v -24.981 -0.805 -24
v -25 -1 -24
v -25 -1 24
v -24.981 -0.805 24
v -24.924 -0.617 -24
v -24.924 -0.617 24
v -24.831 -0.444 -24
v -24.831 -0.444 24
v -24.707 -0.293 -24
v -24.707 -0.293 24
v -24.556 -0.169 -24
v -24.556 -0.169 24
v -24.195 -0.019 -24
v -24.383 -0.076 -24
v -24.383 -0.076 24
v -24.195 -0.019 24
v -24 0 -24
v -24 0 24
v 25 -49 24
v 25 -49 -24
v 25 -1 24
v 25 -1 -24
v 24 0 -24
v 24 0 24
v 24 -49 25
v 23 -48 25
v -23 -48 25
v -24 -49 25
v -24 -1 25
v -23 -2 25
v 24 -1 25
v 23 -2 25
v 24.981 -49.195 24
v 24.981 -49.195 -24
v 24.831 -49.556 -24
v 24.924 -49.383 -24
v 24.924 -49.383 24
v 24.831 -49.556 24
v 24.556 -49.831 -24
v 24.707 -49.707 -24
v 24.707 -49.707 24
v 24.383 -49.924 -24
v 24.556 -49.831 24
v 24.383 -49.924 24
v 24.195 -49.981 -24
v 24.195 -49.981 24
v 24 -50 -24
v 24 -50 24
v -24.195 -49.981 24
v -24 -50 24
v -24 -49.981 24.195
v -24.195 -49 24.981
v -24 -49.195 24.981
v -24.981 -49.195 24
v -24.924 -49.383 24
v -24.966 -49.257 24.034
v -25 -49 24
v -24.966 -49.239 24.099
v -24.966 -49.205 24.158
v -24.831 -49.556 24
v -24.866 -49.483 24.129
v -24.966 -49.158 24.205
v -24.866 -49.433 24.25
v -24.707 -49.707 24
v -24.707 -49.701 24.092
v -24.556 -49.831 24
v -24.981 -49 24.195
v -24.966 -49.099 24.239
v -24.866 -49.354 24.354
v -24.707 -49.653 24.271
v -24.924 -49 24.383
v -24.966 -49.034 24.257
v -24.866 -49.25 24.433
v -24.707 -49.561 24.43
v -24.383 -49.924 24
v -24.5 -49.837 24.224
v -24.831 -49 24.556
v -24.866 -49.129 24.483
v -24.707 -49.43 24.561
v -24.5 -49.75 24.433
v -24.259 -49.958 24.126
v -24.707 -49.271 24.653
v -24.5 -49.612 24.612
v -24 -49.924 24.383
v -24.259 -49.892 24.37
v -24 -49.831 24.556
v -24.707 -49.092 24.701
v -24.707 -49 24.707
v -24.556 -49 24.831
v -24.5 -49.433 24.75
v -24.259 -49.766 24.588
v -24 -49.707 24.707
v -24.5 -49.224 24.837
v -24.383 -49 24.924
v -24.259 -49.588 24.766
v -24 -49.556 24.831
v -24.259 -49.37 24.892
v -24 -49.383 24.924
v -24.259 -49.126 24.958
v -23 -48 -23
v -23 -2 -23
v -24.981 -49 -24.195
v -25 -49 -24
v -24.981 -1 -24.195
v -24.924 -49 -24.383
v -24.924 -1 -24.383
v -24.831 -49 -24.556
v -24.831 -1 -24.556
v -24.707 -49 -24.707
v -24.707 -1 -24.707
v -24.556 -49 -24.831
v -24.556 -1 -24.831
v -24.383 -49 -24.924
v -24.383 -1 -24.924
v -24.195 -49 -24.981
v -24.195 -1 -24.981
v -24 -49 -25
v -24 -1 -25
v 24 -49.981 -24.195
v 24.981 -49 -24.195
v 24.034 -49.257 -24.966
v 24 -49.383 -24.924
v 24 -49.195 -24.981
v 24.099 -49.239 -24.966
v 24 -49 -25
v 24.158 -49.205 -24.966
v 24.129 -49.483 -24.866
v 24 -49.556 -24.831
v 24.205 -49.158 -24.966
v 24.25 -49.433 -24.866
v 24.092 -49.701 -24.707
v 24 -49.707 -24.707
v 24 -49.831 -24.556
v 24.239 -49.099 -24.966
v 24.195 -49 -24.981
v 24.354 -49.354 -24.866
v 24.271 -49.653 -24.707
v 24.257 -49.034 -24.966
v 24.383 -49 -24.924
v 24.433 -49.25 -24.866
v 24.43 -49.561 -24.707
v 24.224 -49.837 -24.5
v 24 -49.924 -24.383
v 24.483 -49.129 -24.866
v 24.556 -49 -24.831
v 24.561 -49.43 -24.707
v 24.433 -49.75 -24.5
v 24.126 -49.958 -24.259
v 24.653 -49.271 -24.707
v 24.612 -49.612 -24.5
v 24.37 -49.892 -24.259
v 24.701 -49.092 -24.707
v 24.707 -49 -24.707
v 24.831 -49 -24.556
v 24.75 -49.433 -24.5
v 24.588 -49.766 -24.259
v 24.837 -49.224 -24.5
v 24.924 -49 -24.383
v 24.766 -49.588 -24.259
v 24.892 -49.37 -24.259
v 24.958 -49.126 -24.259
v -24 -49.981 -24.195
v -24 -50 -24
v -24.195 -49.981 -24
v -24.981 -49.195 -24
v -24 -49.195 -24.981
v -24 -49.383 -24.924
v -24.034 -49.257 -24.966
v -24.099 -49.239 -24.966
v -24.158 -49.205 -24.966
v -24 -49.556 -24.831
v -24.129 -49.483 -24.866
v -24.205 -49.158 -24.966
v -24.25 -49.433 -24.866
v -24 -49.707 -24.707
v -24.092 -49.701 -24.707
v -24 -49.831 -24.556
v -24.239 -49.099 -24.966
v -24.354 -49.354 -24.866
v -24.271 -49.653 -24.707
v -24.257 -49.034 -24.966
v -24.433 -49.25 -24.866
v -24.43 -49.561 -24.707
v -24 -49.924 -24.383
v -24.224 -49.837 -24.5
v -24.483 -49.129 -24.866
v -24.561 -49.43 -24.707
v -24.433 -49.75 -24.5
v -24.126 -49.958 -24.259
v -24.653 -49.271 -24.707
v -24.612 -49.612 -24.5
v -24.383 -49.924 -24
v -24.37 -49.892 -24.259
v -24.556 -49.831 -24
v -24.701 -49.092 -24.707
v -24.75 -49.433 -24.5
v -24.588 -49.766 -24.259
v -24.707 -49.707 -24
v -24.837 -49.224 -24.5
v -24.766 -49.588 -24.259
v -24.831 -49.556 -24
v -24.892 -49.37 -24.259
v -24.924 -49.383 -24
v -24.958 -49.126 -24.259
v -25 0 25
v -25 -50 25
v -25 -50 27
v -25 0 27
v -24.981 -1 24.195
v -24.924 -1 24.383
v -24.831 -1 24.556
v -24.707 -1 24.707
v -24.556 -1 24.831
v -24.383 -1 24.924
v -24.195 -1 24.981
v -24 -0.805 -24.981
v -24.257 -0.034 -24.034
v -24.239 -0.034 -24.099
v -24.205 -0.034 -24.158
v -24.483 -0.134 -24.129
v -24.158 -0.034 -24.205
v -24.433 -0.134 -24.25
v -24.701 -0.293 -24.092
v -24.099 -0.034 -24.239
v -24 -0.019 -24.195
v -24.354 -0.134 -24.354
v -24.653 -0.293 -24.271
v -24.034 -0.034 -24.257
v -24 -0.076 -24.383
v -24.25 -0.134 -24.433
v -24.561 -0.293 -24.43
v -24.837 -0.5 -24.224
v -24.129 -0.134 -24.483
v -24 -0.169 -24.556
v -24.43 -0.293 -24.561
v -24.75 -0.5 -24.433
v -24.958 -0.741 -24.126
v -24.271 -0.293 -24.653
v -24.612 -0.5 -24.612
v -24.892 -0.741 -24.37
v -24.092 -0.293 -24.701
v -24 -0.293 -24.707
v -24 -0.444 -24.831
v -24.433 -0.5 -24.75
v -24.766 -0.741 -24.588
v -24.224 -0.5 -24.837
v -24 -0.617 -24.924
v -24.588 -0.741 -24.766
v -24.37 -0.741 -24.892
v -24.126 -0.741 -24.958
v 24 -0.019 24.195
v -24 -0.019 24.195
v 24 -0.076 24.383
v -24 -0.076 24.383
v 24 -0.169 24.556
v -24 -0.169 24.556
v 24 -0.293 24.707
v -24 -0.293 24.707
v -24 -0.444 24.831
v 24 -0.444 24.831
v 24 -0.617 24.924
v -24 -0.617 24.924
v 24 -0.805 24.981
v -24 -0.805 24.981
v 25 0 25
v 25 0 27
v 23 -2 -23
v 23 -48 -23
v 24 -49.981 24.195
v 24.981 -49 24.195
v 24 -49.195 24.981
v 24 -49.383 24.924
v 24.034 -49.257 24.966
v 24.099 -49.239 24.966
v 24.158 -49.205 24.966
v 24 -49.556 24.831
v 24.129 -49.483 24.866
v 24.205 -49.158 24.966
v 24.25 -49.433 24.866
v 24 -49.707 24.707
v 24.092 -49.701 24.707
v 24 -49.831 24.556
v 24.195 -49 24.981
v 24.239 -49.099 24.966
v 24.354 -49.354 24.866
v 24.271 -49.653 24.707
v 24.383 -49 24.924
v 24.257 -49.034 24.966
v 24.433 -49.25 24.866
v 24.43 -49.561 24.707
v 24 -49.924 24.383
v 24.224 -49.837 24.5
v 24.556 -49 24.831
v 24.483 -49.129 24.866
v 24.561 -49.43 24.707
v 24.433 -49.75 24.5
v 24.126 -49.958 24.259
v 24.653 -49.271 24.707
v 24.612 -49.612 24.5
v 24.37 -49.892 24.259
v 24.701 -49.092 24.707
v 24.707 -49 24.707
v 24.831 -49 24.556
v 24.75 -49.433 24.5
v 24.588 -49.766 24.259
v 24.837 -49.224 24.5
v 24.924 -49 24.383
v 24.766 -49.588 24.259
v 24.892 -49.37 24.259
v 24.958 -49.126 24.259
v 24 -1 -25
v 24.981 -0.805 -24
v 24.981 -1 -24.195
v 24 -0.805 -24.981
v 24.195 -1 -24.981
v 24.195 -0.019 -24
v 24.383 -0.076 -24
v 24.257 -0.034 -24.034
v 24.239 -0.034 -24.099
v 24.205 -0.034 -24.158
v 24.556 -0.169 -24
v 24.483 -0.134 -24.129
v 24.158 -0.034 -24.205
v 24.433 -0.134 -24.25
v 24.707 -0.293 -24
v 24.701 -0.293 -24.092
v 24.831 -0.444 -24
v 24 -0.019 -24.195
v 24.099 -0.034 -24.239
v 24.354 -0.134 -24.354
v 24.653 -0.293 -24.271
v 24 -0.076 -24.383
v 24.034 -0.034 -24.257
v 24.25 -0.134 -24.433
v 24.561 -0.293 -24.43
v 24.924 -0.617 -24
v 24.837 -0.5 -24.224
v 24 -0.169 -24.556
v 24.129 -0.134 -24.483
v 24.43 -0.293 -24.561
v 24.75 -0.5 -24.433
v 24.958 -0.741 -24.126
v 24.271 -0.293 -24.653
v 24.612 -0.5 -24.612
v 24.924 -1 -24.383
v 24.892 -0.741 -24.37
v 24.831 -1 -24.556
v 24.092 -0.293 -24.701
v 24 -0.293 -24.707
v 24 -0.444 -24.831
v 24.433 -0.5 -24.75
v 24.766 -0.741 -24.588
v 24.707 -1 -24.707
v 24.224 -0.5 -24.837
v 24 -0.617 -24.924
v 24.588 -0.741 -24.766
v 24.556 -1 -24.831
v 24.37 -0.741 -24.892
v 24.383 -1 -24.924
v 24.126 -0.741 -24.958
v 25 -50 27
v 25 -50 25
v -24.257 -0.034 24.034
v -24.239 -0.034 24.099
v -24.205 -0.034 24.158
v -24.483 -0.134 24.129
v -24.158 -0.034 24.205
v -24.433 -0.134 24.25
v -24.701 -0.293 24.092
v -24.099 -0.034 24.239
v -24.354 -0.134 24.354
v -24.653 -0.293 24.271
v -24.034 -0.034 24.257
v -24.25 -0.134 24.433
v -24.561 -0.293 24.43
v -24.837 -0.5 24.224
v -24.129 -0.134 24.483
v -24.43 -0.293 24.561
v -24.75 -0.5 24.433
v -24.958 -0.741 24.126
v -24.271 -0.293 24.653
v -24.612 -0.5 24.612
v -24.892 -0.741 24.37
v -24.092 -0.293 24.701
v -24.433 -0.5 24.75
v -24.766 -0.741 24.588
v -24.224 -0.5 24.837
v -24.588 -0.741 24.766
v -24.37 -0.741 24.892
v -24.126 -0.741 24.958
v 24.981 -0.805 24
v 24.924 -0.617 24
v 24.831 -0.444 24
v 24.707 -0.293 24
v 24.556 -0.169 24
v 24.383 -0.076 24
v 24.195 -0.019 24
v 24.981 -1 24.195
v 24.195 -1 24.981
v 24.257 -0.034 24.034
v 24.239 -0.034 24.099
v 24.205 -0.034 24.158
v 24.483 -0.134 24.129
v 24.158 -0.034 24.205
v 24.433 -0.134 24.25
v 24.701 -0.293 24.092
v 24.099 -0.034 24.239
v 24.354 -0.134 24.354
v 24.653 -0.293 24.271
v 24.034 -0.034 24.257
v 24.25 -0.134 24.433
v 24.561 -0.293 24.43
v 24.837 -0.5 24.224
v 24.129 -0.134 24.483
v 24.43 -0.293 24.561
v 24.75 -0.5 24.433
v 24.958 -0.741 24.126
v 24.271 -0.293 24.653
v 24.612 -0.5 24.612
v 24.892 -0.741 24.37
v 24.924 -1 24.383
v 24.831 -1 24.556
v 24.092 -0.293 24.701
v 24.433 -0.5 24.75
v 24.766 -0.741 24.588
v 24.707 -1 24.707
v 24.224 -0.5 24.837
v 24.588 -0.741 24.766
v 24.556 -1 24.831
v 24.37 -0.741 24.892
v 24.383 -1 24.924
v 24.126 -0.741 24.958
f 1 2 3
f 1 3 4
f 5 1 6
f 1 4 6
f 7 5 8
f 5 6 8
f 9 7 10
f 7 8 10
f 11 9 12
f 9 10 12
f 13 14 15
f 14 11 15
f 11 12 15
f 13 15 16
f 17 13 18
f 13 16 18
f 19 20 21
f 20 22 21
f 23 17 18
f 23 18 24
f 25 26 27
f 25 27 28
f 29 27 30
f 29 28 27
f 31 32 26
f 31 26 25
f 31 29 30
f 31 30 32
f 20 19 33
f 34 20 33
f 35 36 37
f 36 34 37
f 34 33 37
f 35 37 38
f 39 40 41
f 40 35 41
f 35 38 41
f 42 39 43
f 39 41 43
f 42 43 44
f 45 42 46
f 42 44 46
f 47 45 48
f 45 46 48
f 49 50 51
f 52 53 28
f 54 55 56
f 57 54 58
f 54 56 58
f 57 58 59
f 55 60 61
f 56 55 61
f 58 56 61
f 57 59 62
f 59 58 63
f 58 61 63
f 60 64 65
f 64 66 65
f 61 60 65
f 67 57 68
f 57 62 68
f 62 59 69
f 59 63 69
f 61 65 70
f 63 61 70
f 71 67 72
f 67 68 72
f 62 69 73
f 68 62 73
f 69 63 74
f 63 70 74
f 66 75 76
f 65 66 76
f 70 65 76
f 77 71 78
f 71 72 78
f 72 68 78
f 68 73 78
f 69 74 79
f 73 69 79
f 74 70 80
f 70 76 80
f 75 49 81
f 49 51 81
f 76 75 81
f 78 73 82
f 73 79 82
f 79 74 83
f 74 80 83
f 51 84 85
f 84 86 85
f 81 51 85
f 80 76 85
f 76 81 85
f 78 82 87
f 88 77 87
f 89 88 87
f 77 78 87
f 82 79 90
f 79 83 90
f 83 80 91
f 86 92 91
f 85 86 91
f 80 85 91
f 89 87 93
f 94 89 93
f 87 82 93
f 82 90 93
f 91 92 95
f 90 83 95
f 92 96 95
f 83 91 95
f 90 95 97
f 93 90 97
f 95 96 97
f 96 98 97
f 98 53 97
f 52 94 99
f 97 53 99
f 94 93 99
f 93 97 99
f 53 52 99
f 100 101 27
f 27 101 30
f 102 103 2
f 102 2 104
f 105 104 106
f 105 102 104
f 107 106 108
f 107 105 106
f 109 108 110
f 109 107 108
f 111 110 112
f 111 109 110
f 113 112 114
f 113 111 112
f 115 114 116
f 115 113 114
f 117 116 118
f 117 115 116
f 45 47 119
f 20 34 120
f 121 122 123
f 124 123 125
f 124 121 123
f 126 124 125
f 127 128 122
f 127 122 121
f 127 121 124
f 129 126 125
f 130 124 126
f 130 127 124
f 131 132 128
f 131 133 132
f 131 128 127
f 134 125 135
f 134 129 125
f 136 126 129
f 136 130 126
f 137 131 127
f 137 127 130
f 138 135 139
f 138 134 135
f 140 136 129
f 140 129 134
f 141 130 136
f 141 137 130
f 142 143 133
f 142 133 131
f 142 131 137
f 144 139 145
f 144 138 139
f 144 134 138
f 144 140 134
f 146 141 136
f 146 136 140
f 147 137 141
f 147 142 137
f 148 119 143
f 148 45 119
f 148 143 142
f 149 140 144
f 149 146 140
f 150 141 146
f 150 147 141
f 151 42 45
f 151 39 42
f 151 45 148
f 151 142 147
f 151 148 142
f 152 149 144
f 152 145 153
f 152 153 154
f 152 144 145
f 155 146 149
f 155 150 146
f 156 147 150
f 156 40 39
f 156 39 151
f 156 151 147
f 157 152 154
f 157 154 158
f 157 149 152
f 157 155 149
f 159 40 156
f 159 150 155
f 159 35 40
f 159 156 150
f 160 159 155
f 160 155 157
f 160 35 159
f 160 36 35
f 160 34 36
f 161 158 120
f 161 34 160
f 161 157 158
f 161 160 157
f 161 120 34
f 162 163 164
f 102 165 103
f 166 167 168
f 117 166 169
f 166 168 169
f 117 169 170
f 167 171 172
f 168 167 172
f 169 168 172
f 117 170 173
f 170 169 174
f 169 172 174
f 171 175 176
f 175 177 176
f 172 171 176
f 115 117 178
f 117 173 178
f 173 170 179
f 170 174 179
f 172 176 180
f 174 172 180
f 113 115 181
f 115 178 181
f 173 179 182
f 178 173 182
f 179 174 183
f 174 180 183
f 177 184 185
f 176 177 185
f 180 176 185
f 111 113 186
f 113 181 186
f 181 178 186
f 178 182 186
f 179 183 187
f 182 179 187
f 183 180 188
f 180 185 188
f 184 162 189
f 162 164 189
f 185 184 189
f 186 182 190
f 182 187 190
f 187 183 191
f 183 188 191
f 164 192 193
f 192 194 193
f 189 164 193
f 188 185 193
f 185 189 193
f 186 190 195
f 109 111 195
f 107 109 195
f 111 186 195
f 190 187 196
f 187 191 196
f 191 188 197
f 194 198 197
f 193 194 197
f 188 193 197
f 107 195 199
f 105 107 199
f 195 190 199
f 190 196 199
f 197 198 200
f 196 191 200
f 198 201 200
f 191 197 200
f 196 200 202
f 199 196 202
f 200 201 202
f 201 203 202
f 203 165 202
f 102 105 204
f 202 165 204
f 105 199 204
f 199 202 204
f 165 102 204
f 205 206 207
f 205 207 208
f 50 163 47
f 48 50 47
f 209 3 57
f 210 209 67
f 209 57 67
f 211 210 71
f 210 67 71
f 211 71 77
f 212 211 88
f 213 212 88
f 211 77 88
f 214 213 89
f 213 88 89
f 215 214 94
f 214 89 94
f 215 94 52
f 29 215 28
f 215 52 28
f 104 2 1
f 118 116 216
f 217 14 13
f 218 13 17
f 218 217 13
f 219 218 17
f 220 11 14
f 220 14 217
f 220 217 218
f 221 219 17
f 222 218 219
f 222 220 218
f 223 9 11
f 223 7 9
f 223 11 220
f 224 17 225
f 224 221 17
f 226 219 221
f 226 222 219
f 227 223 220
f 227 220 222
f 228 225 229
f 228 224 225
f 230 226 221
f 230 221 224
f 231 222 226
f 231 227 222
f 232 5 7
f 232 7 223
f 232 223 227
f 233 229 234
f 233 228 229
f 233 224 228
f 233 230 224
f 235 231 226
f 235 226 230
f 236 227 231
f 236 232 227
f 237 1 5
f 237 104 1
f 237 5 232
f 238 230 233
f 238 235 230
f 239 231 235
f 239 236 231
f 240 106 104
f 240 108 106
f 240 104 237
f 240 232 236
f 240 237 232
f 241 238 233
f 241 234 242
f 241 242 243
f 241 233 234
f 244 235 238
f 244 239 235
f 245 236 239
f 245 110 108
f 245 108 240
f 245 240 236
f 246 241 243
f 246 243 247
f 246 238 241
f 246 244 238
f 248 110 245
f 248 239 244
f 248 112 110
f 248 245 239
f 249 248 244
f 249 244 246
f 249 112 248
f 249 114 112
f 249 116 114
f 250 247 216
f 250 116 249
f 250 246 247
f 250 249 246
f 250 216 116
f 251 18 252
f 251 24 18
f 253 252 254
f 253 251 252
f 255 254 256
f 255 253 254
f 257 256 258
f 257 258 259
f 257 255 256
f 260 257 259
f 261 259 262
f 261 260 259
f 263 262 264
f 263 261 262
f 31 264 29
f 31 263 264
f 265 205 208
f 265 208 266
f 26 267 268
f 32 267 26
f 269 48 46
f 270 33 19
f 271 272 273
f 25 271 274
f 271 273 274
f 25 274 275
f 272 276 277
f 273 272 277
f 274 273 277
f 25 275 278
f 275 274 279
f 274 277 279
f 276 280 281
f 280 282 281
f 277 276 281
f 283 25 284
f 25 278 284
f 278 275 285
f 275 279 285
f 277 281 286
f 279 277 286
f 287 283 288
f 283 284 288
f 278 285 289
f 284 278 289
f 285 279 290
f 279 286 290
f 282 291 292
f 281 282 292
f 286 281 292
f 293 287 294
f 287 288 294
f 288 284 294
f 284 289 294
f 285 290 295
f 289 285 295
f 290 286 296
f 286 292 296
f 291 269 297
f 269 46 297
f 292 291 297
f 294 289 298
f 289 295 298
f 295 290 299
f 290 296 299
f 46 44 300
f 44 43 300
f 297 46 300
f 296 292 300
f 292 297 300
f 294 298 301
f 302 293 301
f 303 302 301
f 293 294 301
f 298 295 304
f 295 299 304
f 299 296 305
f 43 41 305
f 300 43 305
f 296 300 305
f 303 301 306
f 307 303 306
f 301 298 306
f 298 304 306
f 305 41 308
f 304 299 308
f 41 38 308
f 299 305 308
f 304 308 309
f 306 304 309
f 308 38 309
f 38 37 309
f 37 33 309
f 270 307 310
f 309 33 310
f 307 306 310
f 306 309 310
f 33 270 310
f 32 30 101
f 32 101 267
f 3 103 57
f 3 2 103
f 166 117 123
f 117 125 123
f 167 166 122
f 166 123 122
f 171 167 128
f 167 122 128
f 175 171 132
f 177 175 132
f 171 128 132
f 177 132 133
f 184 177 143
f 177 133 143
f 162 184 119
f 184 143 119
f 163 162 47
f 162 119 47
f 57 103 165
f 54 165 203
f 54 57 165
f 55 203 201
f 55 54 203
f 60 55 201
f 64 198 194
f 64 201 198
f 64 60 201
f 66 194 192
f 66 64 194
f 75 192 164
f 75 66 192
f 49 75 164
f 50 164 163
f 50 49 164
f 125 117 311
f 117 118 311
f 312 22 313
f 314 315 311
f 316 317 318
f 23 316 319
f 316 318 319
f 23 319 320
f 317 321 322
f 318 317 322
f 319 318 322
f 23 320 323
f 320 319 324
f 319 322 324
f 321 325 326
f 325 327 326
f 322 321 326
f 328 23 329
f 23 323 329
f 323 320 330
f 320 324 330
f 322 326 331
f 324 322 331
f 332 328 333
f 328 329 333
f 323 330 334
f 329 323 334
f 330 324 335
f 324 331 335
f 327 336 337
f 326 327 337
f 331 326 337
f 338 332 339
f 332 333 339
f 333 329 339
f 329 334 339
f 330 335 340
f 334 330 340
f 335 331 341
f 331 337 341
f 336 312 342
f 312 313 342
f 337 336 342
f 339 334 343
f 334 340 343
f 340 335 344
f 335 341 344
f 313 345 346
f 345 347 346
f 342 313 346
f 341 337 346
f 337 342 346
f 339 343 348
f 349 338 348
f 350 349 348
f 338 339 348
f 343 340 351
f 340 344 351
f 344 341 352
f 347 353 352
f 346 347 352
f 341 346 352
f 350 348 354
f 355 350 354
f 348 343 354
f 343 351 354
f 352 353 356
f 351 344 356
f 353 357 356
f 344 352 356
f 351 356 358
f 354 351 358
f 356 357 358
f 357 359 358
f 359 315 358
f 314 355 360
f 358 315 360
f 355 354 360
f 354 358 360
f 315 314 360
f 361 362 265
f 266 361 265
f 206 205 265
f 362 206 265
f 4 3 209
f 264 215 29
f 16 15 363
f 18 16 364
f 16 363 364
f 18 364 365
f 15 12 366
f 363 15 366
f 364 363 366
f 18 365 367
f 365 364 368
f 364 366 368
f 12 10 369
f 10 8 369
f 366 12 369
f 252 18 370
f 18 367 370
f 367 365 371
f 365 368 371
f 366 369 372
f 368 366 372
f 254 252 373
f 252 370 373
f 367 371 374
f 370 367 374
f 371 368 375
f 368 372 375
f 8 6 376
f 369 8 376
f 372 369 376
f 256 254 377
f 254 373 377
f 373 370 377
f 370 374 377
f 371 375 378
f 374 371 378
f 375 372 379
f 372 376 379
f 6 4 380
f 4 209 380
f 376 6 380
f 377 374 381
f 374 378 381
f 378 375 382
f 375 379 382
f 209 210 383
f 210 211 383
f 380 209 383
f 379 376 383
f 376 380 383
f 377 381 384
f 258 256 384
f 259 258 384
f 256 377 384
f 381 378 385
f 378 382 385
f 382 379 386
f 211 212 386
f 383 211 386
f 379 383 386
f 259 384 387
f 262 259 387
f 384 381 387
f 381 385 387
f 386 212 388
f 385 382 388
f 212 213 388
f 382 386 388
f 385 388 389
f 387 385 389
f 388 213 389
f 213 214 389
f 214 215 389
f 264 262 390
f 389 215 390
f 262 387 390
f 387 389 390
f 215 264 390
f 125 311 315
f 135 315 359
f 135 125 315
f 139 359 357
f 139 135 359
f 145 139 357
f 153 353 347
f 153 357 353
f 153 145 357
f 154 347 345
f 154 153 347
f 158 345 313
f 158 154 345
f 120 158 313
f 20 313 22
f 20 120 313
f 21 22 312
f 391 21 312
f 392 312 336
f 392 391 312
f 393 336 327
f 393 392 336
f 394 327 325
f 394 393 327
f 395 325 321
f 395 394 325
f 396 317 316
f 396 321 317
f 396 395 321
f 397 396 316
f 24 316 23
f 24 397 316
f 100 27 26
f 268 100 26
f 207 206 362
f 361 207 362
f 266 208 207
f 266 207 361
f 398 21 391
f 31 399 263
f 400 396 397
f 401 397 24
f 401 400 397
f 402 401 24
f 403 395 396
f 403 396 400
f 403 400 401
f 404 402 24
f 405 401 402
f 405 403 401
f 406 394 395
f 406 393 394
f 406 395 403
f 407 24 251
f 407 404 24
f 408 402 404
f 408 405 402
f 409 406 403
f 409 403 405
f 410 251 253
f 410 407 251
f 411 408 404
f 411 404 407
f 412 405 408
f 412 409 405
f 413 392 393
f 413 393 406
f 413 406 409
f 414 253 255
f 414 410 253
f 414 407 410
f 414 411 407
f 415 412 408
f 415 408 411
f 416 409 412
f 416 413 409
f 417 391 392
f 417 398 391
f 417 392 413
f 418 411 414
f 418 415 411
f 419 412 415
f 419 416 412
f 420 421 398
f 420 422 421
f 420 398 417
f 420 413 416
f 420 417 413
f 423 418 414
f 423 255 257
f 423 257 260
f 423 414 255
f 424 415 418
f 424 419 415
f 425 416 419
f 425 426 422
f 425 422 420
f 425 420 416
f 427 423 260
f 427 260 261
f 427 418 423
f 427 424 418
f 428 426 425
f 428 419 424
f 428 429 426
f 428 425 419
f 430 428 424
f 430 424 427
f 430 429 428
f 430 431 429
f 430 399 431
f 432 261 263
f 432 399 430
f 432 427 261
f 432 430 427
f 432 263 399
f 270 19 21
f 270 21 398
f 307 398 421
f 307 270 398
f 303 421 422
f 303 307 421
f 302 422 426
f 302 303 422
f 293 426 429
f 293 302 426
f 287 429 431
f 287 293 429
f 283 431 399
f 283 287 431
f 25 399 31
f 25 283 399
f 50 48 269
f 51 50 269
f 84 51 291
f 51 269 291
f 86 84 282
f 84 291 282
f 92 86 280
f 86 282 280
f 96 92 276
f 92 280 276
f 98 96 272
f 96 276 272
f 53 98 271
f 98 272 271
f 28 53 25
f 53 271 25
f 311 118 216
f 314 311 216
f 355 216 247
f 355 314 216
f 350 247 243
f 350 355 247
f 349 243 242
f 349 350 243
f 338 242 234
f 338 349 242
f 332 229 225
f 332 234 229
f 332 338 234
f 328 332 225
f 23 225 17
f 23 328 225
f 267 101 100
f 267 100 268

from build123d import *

# Parameters (mm, degrees)
F0_W     = 50
F0_H     = 50
F1_DEPTH = 50
F2_T     = -2
F3_R     = 1
F5_W     = 50
F5_H     = 50
F6_DEPTH = 2


with BuildPart() as f1:
    # F0 (on Front) → F1 (new body)
    with BuildSketch(Plane.XZ):
        Rectangle(F0_W, F0_H)
    extrude(amount=F1_DEPTH)

    # F2
    f2_openings = [f1.faces().sort_by_distance(p)[0] for p in [
        (0, -25, 25),
    ]]
    offset(amount=F2_T, openings=f2_openings)

    # F3
    f3_edges = [f1.edges().sort_by_distance(p)[0] for p in [
        (25, -50, 0),
        (0, -50, 25),
        (-25, -50, 0),
        (0, -50, -25),
        (25, -25, -25),
        (25, -25, 25),
        (25, 0, 0),
        (-25, -25, 25),
        (-25, -25, -25),
        (-25, 0, 0),
        (0, 0, 25),
        (0, 0, -25),
    ]]
    fillet(f3_edges, radius=F3_R)


with BuildPart() as f6:
    # F5 (on offset) → F6 (new body)
    with BuildSketch(Plane.XY.offset(25)):
        with Locations((0, -25)):
            Rectangle(F5_W, F5_H)
    extrude(amount=F6_DEPTH)


solid = Compound([f1.part, f6.part])
